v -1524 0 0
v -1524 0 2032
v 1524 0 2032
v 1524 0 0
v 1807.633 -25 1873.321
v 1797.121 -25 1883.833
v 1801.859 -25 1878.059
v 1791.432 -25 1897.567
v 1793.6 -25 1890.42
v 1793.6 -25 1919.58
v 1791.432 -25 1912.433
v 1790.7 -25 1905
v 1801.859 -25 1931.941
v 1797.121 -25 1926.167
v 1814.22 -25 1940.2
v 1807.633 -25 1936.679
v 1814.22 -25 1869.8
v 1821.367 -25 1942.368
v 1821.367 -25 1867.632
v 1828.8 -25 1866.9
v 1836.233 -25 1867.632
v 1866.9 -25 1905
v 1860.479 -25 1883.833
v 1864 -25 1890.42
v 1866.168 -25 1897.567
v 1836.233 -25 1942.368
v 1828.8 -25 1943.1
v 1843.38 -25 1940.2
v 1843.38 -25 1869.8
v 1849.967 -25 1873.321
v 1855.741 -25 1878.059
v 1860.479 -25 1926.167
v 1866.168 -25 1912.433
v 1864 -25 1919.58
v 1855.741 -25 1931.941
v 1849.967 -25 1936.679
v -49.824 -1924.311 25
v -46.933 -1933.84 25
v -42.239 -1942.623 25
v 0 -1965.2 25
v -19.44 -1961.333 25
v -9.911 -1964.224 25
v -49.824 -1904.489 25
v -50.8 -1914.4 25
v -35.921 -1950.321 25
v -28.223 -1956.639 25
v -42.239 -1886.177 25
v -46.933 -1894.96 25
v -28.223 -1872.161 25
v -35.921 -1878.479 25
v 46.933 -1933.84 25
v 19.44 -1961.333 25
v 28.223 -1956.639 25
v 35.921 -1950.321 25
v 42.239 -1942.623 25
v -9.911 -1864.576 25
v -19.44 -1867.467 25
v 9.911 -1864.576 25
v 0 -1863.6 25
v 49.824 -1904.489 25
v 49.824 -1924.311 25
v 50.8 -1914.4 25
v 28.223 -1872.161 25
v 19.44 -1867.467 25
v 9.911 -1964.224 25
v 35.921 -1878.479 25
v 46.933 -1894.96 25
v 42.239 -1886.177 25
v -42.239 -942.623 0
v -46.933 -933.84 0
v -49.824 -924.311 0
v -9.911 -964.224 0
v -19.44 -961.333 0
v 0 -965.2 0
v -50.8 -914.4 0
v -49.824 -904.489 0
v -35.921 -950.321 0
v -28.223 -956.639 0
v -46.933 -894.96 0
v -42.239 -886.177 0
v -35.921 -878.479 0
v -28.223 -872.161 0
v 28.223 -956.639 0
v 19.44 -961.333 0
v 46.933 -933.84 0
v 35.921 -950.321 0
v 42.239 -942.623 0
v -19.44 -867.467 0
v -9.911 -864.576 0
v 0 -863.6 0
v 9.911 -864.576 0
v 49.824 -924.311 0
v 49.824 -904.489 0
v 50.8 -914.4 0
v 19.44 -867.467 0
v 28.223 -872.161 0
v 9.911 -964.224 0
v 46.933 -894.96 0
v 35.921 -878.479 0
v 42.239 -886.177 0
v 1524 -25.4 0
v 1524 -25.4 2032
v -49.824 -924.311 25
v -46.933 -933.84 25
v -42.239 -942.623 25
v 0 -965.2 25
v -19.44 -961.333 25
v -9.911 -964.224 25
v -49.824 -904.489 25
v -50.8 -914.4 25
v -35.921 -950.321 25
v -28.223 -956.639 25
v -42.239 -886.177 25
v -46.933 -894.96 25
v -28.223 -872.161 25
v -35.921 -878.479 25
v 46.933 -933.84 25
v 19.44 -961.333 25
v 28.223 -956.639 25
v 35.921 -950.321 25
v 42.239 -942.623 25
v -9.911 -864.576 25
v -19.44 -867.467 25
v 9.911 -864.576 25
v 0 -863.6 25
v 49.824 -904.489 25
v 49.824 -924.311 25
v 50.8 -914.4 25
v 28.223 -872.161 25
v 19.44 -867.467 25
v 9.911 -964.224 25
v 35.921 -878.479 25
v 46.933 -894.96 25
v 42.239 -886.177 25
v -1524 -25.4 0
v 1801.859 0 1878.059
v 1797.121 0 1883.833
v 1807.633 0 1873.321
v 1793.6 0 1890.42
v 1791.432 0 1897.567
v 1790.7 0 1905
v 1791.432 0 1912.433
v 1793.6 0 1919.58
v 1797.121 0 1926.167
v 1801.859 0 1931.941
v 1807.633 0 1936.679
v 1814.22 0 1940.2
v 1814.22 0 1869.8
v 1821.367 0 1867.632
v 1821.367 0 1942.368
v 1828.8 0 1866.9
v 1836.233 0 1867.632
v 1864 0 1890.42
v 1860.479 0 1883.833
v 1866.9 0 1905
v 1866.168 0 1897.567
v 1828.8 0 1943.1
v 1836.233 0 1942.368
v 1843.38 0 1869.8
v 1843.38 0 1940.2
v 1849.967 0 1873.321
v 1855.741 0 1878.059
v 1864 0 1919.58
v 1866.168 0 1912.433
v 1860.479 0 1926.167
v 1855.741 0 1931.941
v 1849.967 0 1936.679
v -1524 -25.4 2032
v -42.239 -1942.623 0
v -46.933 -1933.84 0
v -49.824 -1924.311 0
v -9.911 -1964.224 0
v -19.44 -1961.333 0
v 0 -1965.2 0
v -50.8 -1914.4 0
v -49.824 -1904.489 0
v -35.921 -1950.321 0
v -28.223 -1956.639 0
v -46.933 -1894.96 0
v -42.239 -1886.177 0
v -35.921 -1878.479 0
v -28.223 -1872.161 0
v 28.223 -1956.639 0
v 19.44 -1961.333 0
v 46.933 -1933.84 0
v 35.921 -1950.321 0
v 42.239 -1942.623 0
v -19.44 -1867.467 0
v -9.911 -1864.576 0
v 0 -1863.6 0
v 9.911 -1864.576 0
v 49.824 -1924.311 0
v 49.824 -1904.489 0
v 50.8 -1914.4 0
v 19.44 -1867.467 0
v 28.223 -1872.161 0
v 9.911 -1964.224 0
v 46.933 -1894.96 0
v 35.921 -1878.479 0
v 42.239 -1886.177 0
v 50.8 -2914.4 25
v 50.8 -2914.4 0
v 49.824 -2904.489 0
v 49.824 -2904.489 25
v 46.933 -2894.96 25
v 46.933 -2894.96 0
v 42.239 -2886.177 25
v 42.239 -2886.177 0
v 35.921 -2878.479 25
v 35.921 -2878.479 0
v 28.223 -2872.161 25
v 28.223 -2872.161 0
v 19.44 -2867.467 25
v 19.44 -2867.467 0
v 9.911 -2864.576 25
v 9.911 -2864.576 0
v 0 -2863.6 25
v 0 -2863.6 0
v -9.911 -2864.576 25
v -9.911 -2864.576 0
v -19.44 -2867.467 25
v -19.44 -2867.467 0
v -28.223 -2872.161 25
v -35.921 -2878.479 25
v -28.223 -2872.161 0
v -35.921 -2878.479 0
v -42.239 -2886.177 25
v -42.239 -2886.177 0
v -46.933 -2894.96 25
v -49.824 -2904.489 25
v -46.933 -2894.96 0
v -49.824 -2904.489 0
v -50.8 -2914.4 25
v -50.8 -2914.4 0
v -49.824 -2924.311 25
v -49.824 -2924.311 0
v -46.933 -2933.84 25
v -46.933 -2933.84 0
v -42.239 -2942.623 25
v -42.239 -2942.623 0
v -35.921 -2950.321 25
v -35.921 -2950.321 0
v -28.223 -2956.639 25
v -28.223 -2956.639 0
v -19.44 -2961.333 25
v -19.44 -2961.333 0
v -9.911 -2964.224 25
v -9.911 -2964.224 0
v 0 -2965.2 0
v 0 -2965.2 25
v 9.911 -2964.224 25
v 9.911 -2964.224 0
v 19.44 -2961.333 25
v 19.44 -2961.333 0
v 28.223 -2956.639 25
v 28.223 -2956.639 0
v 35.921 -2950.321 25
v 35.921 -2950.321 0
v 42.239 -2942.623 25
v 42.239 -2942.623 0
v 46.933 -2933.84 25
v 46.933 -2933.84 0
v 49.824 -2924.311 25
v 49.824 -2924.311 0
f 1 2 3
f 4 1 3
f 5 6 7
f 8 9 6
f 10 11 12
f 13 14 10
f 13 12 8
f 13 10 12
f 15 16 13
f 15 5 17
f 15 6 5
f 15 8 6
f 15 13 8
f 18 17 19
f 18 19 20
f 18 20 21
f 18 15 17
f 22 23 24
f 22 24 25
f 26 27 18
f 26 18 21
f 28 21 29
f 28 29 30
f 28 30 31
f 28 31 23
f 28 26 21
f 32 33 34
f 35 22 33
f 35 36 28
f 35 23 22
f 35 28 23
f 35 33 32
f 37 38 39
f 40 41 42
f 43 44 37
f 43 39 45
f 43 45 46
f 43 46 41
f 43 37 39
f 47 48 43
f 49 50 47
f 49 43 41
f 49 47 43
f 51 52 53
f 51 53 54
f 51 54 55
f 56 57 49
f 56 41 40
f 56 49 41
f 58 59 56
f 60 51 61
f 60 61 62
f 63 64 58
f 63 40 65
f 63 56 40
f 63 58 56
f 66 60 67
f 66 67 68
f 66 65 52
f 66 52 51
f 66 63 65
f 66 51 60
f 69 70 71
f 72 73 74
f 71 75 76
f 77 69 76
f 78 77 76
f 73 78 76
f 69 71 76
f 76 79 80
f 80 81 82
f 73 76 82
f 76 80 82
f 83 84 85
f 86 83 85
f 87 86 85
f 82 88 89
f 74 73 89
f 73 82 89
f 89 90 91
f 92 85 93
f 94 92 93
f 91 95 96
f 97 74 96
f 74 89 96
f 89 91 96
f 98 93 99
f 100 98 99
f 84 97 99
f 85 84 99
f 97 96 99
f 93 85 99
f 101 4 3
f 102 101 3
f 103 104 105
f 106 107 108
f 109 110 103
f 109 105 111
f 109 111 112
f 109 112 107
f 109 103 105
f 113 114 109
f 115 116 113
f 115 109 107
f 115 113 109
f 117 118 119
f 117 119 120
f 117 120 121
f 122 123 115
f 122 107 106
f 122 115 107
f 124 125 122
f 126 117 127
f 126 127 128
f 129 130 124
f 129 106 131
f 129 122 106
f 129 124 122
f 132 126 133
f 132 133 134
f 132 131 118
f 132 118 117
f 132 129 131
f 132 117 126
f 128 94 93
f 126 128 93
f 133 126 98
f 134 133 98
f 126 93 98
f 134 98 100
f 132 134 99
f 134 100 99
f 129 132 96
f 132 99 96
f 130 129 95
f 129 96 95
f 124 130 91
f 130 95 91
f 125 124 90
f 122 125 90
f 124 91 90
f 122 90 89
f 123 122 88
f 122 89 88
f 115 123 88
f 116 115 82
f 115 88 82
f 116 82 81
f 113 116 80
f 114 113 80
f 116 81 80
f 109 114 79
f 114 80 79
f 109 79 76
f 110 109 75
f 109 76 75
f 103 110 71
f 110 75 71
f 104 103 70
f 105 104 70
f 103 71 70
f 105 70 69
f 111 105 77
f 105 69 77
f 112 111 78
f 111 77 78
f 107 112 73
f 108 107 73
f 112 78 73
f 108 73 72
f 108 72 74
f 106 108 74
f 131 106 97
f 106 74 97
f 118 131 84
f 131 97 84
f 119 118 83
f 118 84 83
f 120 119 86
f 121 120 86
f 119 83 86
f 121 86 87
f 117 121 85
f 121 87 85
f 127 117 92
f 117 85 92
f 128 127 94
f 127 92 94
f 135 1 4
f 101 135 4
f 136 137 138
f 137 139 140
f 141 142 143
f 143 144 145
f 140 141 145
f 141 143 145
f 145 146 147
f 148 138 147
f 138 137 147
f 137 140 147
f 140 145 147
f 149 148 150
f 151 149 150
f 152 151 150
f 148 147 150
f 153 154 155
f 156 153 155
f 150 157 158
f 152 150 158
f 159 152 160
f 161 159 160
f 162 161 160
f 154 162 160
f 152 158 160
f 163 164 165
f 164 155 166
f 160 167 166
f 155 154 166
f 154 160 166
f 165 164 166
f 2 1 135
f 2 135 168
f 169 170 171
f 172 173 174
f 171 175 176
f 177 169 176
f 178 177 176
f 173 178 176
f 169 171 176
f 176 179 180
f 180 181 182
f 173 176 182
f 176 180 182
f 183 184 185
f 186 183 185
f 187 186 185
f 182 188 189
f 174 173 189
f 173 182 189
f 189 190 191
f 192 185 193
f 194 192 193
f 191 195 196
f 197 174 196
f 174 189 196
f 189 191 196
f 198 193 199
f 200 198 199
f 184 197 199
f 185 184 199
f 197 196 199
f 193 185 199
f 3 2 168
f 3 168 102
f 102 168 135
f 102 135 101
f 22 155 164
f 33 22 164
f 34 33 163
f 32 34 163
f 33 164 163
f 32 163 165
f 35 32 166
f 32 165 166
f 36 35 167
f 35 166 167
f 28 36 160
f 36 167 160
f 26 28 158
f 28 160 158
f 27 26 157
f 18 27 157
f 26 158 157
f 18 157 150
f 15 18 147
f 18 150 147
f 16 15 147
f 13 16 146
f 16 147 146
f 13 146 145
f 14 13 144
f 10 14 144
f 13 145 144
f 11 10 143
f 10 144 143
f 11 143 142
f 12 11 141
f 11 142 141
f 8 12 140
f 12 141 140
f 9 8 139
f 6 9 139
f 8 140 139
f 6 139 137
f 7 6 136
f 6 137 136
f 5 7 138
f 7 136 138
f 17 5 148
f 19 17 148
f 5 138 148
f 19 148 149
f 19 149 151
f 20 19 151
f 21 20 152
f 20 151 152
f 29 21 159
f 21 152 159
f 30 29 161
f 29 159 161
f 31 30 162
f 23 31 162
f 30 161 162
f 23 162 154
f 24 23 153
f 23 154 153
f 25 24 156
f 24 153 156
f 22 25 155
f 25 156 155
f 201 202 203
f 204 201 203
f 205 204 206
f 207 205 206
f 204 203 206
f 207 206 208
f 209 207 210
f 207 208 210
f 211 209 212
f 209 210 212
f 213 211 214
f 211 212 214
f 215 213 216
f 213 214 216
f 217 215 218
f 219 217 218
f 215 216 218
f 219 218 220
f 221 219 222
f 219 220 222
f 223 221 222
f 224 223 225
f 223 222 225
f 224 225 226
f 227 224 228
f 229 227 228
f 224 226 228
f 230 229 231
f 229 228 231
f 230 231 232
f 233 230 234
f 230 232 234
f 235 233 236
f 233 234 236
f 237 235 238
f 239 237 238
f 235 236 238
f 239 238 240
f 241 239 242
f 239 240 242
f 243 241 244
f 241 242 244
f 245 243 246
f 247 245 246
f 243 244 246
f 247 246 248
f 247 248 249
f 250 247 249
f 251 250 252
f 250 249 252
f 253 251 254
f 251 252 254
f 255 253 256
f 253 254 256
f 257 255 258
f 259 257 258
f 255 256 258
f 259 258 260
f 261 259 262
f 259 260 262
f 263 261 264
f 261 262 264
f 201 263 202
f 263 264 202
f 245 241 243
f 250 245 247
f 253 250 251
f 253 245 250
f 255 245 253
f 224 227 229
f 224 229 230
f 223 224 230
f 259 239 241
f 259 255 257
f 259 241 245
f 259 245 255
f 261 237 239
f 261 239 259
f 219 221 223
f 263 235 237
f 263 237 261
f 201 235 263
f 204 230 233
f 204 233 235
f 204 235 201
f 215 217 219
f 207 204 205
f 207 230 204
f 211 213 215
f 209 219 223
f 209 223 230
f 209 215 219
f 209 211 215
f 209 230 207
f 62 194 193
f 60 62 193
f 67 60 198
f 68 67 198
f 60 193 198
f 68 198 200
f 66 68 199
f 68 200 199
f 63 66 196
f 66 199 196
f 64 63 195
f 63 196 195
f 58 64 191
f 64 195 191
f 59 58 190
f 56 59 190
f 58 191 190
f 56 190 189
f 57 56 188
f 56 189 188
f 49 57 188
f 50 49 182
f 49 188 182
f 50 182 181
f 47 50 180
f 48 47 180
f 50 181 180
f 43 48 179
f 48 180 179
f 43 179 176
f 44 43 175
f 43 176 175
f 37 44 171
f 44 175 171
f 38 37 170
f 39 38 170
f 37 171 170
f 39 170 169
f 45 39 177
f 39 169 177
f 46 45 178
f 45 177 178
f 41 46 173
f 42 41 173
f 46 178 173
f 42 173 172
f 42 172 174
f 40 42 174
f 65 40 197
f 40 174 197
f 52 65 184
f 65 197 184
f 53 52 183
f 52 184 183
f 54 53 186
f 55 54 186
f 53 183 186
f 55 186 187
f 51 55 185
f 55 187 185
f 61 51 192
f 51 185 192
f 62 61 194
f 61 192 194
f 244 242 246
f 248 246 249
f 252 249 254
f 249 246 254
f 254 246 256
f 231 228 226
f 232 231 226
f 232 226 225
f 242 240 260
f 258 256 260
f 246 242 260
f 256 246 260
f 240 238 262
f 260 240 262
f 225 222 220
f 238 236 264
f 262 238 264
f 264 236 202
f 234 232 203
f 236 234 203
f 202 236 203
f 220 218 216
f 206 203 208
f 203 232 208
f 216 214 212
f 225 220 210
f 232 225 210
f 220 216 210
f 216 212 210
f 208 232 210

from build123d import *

# Parameters (mm, degrees)
F0_W     = 3048
F0_H     = 2032
F1_DEPTH = 25.4
F2_R     = 38.1
F3_DEPTH = 25
F4_R     = 50.8
F5_DEPTH = 25


with BuildPart() as f1:
    # F0 (on Front) → F1 (new body)
    with BuildSketch(Plane.XZ):
        with Locations((0, 1016)):
            Rectangle(F0_W, F0_H)
    extrude(amount=F1_DEPTH)


with BuildPart() as f3:
    # F2 (on Front) → F3 (new body)
    with BuildSketch(Plane.XZ):
        with Locations((1828.8, 1905)):
            Circle(F2_R)
    extrude(amount=F3_DEPTH)


with BuildPart() as f5:
    # F4 (on Top) → F5 (new body)
    with BuildSketch(Plane.XY):
        with Locations((0, -2914.4)):
            Circle(F4_R)
        with Locations((0, -1914.4)):
            Circle(F4_R)
        with Locations((0, -914.4)):
            Circle(F4_R)
    extrude(amount=F5_DEPTH)


solid = Compound([f1.part, f3.part, f5.part])
